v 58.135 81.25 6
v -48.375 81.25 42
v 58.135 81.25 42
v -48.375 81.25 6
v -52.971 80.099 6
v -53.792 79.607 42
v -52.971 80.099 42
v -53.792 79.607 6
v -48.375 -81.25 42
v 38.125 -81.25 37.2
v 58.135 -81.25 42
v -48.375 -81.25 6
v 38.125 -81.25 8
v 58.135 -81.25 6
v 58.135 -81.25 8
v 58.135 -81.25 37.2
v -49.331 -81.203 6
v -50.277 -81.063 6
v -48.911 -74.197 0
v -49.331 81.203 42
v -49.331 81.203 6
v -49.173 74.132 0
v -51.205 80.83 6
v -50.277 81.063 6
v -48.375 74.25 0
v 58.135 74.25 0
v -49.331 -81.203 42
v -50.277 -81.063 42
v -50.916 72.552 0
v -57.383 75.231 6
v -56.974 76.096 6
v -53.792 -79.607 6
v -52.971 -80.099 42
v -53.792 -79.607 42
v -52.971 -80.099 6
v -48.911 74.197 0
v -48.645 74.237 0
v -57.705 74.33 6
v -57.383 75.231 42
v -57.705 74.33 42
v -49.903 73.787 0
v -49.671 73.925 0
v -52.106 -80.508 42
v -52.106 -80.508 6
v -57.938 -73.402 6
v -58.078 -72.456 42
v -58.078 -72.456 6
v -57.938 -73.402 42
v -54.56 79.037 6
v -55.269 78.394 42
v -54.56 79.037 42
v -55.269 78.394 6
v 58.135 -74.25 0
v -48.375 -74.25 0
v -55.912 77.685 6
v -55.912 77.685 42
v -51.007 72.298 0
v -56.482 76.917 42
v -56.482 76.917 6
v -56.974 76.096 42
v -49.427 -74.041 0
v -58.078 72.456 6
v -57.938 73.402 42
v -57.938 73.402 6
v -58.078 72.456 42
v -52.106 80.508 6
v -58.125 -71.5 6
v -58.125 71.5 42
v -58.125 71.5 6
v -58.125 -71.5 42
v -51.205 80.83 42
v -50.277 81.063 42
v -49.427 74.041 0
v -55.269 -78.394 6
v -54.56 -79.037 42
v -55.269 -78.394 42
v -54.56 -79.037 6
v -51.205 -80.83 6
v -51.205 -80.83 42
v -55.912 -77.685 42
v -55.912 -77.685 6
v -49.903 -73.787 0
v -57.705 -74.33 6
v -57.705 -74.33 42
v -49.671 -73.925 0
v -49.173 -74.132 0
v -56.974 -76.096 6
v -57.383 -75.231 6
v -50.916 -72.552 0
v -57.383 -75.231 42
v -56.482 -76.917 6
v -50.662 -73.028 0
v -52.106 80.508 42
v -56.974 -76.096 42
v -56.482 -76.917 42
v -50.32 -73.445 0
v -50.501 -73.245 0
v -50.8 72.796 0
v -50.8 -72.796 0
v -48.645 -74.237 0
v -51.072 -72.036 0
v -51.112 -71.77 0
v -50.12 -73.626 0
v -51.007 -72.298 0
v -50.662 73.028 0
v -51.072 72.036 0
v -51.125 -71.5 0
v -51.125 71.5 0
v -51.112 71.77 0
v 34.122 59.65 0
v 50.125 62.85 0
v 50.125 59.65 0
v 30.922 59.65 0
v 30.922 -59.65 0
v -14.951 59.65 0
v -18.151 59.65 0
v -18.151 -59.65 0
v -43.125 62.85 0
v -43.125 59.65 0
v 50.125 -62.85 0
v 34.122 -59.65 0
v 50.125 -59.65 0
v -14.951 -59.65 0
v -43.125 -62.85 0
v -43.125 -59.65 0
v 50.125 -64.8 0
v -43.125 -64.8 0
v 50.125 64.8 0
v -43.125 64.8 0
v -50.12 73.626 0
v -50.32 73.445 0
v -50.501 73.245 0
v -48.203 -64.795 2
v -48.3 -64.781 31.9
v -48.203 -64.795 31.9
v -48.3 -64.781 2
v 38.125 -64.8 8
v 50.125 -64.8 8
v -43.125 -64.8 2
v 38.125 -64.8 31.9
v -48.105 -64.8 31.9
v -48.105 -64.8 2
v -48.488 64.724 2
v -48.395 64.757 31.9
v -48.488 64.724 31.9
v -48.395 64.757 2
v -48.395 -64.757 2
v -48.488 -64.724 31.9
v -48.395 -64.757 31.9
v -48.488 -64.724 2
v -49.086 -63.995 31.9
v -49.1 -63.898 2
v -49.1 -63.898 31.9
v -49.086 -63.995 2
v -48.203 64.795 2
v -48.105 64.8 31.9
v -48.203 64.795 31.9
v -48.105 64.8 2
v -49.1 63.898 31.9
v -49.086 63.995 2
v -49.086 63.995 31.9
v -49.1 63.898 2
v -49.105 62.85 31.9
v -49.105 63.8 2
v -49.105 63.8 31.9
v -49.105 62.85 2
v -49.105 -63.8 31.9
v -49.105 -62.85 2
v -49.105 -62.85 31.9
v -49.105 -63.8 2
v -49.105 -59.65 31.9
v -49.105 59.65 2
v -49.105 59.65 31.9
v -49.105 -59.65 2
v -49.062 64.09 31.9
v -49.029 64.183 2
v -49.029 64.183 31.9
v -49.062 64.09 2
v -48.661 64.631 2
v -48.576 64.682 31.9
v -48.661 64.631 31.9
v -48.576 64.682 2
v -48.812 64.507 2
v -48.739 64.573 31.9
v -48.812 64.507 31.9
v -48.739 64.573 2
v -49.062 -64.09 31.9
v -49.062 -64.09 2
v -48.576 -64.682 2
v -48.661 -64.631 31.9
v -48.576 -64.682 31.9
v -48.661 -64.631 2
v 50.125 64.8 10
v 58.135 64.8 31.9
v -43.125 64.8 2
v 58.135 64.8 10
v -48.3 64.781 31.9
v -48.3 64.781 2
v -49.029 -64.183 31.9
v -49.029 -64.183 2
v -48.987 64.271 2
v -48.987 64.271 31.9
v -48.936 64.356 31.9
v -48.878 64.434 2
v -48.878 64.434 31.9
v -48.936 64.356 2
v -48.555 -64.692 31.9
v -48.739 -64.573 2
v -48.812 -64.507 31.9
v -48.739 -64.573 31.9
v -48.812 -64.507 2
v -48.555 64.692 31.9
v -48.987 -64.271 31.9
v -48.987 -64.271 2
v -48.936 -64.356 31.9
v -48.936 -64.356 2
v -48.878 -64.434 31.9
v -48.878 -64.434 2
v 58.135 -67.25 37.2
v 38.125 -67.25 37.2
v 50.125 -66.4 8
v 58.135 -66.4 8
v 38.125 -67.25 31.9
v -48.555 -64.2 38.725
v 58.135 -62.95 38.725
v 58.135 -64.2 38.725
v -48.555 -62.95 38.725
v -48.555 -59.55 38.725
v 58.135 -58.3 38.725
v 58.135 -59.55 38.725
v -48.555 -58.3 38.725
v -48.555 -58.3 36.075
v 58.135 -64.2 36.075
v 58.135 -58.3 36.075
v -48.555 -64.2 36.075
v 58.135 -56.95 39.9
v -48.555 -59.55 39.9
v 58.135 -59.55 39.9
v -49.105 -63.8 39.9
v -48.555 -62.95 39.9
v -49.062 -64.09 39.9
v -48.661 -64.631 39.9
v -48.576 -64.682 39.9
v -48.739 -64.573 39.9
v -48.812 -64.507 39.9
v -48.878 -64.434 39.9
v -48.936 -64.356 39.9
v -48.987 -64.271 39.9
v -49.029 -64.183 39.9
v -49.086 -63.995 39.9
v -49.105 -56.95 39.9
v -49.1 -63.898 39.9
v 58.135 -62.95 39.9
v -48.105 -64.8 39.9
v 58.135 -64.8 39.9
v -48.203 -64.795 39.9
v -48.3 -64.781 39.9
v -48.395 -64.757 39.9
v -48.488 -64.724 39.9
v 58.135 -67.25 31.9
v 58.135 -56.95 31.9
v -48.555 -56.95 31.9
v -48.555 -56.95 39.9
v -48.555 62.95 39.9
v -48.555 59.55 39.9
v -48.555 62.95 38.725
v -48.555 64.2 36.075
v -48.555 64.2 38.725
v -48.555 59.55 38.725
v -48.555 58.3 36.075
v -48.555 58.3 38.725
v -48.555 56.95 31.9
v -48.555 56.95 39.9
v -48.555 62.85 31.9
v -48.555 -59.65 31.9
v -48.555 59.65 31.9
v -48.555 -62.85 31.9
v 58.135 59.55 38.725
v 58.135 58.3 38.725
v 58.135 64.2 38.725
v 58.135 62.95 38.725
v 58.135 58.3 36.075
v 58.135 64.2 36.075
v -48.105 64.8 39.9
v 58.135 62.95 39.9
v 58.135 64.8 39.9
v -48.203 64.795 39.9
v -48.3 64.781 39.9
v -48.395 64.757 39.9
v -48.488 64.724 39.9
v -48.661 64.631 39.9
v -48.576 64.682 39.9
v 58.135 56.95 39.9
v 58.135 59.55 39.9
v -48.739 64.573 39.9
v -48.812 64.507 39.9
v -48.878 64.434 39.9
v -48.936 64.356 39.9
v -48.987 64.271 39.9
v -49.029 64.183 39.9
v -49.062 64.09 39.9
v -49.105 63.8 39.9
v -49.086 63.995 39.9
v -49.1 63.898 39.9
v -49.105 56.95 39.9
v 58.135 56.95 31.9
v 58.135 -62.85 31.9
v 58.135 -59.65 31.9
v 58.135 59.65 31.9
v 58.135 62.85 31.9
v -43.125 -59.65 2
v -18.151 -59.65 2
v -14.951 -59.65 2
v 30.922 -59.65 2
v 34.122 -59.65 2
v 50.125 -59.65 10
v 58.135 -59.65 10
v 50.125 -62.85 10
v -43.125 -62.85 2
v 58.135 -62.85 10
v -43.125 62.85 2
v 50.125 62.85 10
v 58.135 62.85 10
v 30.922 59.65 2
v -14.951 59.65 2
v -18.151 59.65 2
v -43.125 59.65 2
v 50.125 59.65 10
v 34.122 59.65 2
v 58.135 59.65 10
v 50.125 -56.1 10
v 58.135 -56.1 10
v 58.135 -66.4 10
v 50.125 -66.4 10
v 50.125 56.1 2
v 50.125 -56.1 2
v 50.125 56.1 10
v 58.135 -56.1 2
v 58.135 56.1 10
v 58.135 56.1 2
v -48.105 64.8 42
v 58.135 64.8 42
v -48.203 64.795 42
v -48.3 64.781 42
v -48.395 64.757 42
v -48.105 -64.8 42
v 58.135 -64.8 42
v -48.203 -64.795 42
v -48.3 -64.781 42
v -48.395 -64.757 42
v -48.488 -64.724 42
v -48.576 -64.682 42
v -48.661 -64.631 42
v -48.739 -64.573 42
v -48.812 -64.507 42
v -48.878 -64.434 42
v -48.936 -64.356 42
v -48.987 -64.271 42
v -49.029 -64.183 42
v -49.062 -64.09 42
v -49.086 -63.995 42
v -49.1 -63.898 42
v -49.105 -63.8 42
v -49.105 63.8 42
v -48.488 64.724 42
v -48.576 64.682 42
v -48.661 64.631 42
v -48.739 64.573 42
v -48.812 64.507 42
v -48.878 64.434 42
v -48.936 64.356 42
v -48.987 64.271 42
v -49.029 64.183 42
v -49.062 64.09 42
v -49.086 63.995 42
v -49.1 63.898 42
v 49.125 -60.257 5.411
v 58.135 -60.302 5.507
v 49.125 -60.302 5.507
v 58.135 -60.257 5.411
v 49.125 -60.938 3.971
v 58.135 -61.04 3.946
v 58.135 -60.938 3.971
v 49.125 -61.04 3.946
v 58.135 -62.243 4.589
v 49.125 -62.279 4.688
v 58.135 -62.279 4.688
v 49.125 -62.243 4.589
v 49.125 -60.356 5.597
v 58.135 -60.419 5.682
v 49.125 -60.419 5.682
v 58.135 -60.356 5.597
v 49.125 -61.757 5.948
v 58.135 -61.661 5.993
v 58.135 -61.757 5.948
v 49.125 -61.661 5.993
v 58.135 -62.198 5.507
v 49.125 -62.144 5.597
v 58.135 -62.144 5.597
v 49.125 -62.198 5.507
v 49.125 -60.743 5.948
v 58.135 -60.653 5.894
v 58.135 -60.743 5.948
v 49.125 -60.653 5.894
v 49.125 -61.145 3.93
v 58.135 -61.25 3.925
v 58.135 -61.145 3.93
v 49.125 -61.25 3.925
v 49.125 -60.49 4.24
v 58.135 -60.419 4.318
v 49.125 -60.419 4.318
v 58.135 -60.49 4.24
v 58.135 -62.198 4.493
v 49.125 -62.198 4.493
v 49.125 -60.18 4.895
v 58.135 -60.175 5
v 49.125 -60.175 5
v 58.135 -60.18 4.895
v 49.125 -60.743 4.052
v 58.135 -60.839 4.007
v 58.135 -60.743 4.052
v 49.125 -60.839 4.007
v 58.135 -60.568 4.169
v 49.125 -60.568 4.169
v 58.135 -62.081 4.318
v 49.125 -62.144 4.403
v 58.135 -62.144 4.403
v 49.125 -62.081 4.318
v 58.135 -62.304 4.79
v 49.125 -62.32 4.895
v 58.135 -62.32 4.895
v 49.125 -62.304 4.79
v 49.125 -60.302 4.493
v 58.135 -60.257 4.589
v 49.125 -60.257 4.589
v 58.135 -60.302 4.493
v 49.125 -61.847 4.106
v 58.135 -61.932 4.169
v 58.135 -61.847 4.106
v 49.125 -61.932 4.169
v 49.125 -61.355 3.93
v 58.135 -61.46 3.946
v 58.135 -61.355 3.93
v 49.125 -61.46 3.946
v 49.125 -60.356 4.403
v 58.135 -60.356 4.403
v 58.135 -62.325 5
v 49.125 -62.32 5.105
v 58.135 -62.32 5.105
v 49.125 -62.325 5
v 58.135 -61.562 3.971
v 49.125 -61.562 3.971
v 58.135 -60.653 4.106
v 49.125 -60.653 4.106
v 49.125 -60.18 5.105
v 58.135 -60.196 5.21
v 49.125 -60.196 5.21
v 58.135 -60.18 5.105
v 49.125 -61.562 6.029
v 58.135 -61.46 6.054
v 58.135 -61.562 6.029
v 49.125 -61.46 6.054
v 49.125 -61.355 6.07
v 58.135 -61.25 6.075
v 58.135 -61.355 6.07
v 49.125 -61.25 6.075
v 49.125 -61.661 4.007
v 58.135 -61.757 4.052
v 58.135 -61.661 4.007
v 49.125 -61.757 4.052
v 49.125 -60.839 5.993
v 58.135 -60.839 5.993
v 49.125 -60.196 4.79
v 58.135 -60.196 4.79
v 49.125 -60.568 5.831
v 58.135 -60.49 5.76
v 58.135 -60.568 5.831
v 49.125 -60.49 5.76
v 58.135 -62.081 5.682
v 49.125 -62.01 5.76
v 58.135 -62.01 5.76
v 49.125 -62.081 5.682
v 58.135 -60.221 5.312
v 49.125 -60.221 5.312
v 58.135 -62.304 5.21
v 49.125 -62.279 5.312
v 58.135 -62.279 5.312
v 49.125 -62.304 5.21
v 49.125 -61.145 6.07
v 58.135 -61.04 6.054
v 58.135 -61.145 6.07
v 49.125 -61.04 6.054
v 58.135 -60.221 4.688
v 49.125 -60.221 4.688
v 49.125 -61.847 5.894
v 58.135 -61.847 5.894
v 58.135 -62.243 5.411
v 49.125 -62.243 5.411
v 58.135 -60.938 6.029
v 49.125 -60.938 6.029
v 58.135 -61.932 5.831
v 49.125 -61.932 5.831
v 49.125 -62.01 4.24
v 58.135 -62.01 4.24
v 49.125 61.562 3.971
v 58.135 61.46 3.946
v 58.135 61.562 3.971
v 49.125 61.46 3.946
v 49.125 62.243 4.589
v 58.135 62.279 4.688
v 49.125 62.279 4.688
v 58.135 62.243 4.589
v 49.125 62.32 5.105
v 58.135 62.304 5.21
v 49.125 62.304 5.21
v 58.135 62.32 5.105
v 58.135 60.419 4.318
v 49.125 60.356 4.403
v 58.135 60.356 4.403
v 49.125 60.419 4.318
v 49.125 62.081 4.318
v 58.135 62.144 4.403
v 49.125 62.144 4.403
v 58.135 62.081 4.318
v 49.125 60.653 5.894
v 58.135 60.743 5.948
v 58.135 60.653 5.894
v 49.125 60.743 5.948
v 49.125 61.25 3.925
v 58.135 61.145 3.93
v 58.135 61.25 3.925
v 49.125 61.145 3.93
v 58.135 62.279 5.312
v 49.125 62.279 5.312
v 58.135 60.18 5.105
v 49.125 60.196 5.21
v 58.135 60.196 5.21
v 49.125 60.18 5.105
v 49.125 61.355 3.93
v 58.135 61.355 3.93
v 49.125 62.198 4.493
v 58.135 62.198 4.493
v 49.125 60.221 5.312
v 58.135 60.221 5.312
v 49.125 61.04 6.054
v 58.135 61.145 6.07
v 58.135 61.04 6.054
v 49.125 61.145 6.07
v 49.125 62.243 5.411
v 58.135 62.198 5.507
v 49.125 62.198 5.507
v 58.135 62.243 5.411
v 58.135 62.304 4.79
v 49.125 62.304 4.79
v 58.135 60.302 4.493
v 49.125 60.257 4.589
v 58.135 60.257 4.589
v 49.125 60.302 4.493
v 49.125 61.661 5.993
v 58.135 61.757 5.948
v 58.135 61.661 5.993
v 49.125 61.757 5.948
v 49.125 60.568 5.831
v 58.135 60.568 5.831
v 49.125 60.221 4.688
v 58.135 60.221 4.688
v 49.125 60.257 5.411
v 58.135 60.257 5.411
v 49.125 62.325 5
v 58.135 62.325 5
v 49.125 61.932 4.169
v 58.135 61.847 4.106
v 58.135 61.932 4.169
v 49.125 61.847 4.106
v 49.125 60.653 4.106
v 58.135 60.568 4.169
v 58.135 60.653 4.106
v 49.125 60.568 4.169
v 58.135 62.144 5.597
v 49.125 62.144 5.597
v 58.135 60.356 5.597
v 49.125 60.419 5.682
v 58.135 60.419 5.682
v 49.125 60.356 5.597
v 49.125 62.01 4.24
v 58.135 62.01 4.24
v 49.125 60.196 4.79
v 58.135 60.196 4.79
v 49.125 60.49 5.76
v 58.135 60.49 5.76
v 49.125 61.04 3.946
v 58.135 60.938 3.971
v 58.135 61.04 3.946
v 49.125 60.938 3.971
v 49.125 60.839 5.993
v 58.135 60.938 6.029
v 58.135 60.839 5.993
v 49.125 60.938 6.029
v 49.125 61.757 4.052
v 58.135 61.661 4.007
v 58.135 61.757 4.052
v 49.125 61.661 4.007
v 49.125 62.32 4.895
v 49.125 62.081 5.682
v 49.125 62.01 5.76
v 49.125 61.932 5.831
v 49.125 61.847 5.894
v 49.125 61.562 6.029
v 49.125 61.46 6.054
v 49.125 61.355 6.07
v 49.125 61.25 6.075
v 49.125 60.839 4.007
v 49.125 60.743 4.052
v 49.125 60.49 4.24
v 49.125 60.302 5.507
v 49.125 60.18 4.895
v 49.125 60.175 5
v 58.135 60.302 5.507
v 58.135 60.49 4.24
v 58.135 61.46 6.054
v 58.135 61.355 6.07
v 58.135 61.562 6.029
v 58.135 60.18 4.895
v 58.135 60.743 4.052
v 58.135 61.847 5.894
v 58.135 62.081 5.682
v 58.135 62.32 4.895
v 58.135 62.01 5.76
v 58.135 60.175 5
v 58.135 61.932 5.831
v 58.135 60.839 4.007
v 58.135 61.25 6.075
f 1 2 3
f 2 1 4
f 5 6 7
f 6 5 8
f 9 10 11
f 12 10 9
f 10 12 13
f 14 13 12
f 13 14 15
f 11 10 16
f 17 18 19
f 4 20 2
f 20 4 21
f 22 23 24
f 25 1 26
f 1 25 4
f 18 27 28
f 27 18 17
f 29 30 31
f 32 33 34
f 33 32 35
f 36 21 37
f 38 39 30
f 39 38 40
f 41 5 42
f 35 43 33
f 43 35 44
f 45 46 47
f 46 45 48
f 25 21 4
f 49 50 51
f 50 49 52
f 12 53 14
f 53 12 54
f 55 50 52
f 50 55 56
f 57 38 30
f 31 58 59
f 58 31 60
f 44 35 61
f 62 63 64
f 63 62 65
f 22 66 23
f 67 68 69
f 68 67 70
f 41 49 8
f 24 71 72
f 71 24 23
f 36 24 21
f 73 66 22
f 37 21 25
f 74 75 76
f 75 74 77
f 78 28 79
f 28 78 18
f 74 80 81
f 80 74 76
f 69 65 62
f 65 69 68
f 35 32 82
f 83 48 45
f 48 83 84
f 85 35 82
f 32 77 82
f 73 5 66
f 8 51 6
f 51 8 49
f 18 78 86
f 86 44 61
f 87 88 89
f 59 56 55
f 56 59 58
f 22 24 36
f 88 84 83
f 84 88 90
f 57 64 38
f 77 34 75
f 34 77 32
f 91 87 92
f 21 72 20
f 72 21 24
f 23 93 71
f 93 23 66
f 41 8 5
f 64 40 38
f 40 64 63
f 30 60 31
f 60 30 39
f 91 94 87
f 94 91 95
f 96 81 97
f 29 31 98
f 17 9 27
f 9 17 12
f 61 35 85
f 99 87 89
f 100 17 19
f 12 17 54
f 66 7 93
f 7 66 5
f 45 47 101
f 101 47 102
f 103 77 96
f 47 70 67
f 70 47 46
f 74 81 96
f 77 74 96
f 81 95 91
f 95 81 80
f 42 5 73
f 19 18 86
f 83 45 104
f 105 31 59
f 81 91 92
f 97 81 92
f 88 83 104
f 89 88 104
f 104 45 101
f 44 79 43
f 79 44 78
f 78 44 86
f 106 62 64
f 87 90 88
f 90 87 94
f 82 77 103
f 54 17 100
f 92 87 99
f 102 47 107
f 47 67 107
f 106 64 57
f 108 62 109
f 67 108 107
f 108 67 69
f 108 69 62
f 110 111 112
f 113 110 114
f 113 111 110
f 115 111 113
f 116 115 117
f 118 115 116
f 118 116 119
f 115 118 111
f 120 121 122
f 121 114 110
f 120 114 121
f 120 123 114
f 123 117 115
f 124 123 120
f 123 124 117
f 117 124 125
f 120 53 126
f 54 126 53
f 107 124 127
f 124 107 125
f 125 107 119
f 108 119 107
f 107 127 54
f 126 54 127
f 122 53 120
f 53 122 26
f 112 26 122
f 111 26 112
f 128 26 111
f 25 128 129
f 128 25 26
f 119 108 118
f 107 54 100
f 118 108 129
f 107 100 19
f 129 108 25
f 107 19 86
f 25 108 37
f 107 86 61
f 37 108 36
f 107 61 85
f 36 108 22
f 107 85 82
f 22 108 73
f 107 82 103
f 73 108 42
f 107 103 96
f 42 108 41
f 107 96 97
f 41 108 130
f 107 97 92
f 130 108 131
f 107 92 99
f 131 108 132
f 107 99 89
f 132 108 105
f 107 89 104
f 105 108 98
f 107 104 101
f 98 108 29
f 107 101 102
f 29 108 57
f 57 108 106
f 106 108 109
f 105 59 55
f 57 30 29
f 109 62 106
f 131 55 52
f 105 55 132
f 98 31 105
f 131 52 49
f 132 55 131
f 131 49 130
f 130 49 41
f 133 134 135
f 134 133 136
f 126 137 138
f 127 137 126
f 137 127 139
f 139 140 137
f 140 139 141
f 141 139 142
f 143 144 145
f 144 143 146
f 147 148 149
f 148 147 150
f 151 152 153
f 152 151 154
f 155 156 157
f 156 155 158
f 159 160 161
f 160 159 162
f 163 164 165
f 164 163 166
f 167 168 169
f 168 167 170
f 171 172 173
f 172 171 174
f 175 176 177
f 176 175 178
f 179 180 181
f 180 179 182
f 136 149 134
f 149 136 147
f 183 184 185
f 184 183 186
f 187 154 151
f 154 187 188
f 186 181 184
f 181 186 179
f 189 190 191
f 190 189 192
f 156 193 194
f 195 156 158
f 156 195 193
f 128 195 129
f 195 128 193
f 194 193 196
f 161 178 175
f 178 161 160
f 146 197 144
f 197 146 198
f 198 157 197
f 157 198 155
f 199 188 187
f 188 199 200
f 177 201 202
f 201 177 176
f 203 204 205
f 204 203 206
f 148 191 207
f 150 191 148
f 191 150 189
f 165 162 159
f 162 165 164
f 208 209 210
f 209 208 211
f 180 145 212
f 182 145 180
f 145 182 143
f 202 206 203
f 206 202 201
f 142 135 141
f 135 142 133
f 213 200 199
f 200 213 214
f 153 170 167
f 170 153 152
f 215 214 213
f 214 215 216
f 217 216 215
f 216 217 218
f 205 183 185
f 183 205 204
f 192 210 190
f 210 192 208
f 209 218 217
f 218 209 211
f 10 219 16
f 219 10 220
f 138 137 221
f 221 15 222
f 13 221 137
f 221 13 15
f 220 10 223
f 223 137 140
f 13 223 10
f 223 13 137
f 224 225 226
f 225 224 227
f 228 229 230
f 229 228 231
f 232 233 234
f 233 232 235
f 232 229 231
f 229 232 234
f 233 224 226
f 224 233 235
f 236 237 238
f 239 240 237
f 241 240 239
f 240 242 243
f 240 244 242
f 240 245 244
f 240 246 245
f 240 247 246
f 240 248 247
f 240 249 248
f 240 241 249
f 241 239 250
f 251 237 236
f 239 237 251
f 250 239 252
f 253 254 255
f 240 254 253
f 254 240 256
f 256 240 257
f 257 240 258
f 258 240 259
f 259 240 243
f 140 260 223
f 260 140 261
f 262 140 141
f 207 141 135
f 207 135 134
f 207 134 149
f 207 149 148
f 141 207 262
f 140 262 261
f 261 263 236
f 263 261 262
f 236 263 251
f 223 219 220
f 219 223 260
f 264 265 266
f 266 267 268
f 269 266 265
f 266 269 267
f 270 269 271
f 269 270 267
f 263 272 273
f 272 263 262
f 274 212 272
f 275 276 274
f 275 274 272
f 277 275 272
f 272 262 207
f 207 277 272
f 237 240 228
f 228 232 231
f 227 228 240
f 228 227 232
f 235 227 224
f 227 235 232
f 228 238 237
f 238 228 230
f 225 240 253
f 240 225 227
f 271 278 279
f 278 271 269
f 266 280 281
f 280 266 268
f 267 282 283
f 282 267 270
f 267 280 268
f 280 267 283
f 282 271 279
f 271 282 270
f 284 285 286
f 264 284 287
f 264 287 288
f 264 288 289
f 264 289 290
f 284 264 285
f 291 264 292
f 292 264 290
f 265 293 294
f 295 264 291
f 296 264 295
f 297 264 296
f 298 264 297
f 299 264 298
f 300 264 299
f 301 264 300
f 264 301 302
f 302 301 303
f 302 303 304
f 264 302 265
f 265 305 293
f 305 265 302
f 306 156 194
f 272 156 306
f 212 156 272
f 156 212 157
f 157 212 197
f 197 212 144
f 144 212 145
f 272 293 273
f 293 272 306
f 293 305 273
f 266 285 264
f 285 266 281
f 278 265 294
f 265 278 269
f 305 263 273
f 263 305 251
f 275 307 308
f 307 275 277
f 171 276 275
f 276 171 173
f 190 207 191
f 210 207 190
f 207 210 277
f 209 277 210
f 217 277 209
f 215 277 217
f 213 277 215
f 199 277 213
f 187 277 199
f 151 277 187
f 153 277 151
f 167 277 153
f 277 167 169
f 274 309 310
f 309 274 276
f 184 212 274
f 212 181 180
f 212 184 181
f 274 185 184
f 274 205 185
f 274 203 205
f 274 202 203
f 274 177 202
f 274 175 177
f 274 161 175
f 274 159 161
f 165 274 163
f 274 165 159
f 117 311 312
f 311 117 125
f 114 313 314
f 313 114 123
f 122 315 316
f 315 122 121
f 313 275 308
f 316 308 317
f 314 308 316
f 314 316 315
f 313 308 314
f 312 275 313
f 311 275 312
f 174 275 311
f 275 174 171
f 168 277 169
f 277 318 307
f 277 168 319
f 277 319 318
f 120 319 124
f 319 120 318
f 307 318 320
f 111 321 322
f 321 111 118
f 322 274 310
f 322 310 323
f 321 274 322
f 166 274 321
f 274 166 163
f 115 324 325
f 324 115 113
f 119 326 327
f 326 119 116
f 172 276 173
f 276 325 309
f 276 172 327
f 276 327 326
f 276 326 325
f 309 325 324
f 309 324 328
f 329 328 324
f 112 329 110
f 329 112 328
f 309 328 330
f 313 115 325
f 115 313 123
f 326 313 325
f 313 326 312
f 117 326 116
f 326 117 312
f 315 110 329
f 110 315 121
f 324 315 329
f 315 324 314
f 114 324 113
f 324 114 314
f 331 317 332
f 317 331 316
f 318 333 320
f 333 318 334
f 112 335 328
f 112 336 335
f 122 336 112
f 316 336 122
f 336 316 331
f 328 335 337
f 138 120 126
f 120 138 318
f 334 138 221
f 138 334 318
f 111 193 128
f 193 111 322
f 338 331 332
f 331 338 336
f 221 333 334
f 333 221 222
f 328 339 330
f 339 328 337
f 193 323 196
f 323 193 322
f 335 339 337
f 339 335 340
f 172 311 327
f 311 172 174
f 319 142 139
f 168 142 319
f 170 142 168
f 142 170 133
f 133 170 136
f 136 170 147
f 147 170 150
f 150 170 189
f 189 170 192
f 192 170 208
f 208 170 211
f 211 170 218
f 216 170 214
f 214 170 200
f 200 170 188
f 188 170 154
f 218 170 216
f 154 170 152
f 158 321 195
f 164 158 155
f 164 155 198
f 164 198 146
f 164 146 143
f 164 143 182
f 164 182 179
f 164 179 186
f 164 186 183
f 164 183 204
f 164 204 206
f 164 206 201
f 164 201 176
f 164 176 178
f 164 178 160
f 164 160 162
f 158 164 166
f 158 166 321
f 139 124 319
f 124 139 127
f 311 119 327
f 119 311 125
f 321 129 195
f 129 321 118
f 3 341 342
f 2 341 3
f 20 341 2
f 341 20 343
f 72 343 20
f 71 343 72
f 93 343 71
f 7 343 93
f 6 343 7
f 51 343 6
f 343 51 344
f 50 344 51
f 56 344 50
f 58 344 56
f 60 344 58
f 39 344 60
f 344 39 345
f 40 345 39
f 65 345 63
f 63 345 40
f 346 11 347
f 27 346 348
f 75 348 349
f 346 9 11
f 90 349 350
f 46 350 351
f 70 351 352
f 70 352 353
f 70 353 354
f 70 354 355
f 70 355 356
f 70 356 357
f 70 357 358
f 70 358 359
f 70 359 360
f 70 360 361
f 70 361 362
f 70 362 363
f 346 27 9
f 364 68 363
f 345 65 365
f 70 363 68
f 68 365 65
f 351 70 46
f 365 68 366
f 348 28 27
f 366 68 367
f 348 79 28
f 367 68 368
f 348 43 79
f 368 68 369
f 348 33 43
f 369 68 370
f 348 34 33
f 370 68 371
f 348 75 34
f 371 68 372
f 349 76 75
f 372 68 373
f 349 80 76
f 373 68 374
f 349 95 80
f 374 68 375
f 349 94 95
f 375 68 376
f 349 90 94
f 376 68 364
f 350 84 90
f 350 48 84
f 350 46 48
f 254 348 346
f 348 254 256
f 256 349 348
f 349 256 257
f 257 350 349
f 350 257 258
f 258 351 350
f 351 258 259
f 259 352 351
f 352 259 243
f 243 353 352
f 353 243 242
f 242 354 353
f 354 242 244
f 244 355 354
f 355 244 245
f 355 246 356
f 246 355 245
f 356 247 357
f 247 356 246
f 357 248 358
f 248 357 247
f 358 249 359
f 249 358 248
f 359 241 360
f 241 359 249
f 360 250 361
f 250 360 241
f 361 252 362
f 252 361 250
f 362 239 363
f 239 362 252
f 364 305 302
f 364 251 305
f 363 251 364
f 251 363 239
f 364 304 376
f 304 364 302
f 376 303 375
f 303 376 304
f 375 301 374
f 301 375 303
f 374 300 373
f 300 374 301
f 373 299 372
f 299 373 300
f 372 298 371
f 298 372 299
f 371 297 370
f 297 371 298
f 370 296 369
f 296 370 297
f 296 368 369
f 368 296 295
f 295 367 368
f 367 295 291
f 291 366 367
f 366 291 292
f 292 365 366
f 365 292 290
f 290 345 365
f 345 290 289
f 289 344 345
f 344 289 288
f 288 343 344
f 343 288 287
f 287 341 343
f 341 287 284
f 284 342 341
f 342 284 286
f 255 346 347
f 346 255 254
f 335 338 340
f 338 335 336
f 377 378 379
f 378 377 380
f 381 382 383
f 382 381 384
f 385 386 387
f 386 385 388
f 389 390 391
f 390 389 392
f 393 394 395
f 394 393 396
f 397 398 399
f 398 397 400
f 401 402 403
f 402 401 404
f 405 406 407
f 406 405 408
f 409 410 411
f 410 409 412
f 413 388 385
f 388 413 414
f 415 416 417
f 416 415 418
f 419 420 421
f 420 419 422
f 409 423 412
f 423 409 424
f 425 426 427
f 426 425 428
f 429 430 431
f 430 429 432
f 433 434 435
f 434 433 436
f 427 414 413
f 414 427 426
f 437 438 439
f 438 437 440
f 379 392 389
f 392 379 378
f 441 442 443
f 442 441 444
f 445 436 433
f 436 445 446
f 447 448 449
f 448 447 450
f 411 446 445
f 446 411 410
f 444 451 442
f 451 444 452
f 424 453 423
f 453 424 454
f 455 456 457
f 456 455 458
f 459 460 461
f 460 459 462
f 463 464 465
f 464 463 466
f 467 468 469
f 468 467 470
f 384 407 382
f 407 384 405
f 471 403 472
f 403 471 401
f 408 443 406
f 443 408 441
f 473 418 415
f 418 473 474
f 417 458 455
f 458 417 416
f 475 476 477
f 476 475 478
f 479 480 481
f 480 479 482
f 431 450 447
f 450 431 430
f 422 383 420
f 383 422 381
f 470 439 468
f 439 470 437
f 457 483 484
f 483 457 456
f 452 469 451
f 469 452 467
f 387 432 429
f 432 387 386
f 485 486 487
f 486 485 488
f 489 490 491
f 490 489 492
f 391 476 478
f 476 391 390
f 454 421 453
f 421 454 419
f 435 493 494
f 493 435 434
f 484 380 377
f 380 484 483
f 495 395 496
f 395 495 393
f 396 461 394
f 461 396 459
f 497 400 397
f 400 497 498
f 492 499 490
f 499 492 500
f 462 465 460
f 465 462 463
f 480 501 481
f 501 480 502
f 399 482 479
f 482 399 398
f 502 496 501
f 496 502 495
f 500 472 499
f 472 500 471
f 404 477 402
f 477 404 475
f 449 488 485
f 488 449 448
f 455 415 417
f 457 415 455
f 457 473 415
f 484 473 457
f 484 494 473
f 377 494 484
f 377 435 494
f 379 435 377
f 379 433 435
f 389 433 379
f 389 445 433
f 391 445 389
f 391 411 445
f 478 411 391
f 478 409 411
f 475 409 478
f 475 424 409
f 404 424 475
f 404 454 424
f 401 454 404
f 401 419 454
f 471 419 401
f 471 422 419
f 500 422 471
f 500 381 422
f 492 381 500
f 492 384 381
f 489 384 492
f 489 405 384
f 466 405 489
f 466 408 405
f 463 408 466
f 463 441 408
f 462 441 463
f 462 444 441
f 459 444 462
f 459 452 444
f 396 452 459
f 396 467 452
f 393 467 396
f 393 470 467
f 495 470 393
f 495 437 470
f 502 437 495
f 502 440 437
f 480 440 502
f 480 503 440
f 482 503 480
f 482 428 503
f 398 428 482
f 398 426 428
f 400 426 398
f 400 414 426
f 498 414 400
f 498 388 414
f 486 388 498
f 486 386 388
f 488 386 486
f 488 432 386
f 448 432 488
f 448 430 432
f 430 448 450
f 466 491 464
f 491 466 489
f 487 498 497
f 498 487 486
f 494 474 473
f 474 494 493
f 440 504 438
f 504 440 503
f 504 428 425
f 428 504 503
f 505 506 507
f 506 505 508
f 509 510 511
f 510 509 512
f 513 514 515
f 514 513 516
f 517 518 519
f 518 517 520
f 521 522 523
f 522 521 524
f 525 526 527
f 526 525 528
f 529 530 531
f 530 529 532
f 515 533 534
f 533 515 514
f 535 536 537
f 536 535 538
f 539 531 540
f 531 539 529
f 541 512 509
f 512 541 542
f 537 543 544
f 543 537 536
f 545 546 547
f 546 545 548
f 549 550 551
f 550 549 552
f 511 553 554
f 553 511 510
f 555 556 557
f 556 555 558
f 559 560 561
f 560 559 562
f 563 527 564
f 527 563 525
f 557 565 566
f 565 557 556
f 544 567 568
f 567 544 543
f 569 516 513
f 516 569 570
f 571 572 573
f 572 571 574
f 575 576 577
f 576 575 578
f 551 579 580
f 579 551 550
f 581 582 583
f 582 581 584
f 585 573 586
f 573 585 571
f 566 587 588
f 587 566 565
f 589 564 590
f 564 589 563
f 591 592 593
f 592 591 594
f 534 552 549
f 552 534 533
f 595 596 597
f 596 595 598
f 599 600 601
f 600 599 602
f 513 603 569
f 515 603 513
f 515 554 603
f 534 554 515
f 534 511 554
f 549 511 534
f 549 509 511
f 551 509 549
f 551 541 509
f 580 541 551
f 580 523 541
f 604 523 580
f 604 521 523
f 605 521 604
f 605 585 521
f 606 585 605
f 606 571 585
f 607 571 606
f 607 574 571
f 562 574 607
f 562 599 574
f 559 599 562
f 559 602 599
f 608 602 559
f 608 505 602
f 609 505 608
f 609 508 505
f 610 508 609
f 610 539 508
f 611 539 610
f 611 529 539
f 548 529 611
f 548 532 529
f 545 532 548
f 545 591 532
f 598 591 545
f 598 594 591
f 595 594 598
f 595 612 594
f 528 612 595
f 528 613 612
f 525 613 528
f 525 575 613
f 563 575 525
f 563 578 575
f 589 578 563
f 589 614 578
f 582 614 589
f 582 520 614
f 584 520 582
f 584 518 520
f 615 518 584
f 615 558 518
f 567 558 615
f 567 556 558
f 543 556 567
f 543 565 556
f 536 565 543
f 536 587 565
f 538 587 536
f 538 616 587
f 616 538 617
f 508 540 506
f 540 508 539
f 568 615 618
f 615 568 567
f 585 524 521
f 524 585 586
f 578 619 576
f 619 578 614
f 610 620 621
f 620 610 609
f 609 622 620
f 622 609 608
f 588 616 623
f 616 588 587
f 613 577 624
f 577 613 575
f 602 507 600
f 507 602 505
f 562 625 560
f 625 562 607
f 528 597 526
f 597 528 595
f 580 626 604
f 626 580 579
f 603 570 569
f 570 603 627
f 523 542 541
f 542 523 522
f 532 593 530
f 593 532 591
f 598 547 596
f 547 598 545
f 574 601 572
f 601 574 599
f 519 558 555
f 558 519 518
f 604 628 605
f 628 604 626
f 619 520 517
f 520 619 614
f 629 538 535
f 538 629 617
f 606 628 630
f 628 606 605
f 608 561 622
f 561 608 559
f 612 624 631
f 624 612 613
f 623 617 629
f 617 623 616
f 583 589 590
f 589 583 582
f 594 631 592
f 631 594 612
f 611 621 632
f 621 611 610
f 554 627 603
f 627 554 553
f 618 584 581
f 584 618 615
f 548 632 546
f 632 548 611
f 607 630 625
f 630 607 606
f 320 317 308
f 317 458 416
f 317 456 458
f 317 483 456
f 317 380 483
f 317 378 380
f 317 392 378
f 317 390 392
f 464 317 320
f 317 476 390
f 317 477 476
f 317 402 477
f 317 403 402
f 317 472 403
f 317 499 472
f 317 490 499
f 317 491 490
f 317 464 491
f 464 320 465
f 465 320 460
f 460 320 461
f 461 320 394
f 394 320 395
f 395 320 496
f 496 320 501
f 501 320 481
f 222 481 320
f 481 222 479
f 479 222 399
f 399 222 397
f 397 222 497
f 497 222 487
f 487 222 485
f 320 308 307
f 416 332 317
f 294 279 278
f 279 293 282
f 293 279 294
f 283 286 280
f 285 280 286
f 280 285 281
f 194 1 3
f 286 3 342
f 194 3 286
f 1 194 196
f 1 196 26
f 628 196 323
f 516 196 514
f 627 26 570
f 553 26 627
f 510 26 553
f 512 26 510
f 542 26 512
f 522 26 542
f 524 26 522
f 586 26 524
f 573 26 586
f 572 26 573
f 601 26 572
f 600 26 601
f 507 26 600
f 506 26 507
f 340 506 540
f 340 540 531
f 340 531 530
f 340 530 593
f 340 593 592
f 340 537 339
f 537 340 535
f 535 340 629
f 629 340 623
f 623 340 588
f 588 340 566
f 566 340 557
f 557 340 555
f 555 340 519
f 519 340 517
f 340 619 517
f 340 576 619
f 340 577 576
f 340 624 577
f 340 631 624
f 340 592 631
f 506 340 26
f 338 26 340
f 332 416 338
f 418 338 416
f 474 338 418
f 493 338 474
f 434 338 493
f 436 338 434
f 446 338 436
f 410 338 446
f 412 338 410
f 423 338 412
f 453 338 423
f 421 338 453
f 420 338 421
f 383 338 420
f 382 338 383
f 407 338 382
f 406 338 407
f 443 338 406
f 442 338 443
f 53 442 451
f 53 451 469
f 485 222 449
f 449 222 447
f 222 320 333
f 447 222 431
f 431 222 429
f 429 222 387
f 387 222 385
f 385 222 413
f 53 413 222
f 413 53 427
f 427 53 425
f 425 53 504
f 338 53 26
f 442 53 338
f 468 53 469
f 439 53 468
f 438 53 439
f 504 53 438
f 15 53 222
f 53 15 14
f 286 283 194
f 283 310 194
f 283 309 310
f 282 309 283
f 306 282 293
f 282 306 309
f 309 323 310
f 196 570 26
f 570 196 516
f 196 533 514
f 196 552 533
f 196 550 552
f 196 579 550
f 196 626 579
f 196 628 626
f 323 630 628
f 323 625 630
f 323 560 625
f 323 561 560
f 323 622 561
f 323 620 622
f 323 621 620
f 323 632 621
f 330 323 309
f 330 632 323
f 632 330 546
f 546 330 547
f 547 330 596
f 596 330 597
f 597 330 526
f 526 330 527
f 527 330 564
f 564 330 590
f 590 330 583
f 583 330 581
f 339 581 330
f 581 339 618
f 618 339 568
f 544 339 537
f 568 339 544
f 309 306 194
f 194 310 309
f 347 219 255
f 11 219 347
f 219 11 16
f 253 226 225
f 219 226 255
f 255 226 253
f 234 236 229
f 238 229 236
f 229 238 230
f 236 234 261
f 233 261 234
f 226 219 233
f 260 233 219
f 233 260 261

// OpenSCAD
// Peli-style case insert for 42HP / 3U Eurorack
// Case marked: MG 235x165x45 (base)
// Outer profile shrinks at the floor to clear the case's floor-to-wall fillet
// (+ light draft). Print foot-down on A1 Mini; two halves.
//
// OpenSCAD Customizer:
//   part = "left" | "right" | "both" | "assembled"

/* [Which part] */
part = "left"; // ["left", "right", "both", "assembled"]

/* [Case interior] */
case_l = 235;
case_w = 165;
case_h = 45;
case_corner_r = 11;    // confirmed via corner fit test
fit_clearance = 2.5;   // was 1.0 — print was tight and bowed in the case
// Floor-to-wall fillet inside the case (confirmed via corner fit test)
base_fillet_r = 6;
// Extra inset at the very bottom for mould draft / print tolerance
draft_inset = 1.0;

/* [Frame] */
wall = 2.4;
foot_t = 2.0;
foot_w = 8.0;
deck_t = 2.8;
insert_h = 42;
rail_h = 8.0;
// Rail is asymmetric about the screw/nut centre (hole line):
// less material toward the bay (PCB clearance), more toward the panel edge.
rail_bay = 4.3;            // from slot centre toward module bay (~1.35mm nut wall)
rail_outer = 6.0;          // from slot centre toward panel edge
spine_w = 3.2;

/* [Eurorack — Doepfer / standard 3U] */
hp = 5.08;
hp_count = 42;
panel_l = hp_count * hp;   // 213.36 — nominal 42HP
panel_h = 128.5;           // standard 3U panel height
hole_inset = 3.0;          // hole centre from panel top/bottom edge
panel_t = 1.6;
module_drop = 0.5;         // seat panel this much below deck
panel_clear = 0.55;
panel_corner_r = 1.0;

/* [M3 square nut track] */
nut_cavity_w = 5.9;
nut_cavity_h = 2.6;
screw_slot = 3.4;          // M3 clearance — ~1.25mm nut overlap each side
slot_lip = 1.2;            // solid retainer over the nut


/* [Split join — filament / dowel pins] */
pin_d = 2.0;
pin_clear = 0.15;
join_boss_x = 16;
join_boss_h = 10;

/* [Quality] */
$fn = 64;

// ---------------------------------------------------------------------------
// Derived
// ---------------------------------------------------------------------------
outer_l = case_l - fit_clearance;
outer_w = case_w - fit_clearance;
outer_r = max(1, case_corner_r - fit_clearance / 2);

// Bottom footprint clears fillet + draft (usable floor is smaller than rim)
bottom_inset = base_fillet_r + draft_inset;
bottom_l = outer_l - 2 * bottom_inset;
bottom_w = outer_w - 2 * bottom_inset;
bottom_r = max(1, outer_r - bottom_inset);

rail_span = panel_l;                         // full 42HP
rail_hole_cc = panel_h - 2 * hole_inset;     // 122.5
rail_y0 = -rail_hole_cc / 2;
rail_y1 =  rail_hole_cc / 2;
rail_top_z = insert_h - panel_t - module_drop;
rail_z = rail_top_z - rail_h;
rail_len = rail_span + 2 * wall;
rail_w = rail_bay + rail_outer;              // total rail width

panel_pocket_l = panel_l + 2 * panel_clear;
panel_pocket_w = panel_h + 2 * panel_clear;

wall_inner_h = insert_h - deck_t;

echo(str("Rim outer: ", outer_l, " x ", outer_w, " R", outer_r));
echo(str("Floor outer: ", bottom_l, " x ", bottom_w, " R", bottom_r,
         " (fillet ", base_fillet_r, " + draft ", draft_inset, ")"));
echo(str("42HP x 3U panel: ", panel_l, " x ", panel_h));
echo(str("Panel pocket: ", panel_pocket_l, " x ", panel_pocket_w));
echo(str("Rail hole CC: ", rail_hole_cc, " (holes ", hole_inset, " from edge)"));
echo(str("Rail section: bay ", rail_bay, " / outer ", rail_outer,
         " (nut side wall ", rail_bay - nut_cavity_w / 2, " mm)"));
echo(str("Module drop: ", module_drop, " mm, slot lip: ", slot_lip, " mm"));
echo(str("Half length at rim: ", outer_l / 2, " mm"));

// ---------------------------------------------------------------------------
// Helpers
// ---------------------------------------------------------------------------
module rounded_rect(size, r) {
    l = size[0];
    w = size[1];
    rr = min(r, l / 2 - 0.01, w / 2 - 0.01);
    offset(r = rr)
        square([l - 2 * rr, w - 2 * rr], center = true);
}

module frame_ring_2d(outer_size, inner_shrink, r) {
    difference() {
        rounded_rect(outer_size, r);
        rounded_rect(
            [outer_size[0] - 2 * inner_shrink, outer_size[1] - 2 * inner_shrink],
            max(0.4, r - inner_shrink)
        );
    }
}

// Cross-section of the case-fit outline at height z (0 = floor).
// Blends from reduced floor size up to full rim size over base_fillet_r.
module fit_profile_2d(z, inset = 0) {
    t = base_fillet_r <= 0 ? 1 : min(1, max(0, z) / base_fillet_r);
    l = bottom_l + t * (outer_l - bottom_l) - 2 * inset;
    w = bottom_w + t * (outer_w - bottom_w) - 2 * inset;
    r = max(0.4, bottom_r + t * (outer_r - bottom_r) - inset);
    rounded_rect([max(l, 1), max(w, 1)], r);
}

// Solid loft that follows the case fillet (small at floor → full at rim)
module fit_loft_solid(h, inset = 0) {
    hull() {
        translate([0, 0, 0])
            linear_extrude(height = 0.02)
                fit_profile_2d(0, inset);
        translate([0, 0, base_fillet_r])
            linear_extrude(height = 0.02)
                fit_profile_2d(base_fillet_r, inset);
        if (h > base_fillet_r + 0.05)
            translate([0, 0, h])
                linear_extrude(height = 0.02)
                    fit_profile_2d(base_fillet_r, inset);
    }
}

module t_slot_rail(length, bay_dir) {
    // bay_dir: sign toward the module bay (+1 or -1 along Y)
    // Slot/nut stay on the hole centreline. Body is asymmetric:
    // rail_bay toward the bay (PCB clearance), rail_outer toward the panel edge.
    nut_z = rail_h - slot_lip - nut_cavity_h / 2;
    y_bay = bay_dir * rail_bay;
    y_outer = -bay_dir * rail_outer;
    y_min = min(y_bay, y_outer);
    y_max = max(y_bay, y_outer);
    body_w = y_max - y_min;
    body_cy = (y_min + y_max) / 2;

    difference() {
        translate([0, body_cy, rail_h / 2])
            cube([length, body_w, rail_h], center = true);

        // Nut gallery — centred on the hole/slot line (Y=0 local)
        translate([0, 0, nut_z])
            cube([length - 2 * wall, nut_cavity_w, nut_cavity_h + 0.05], center = true);

        // Screw slot through top lip
        translate([0, 0, rail_h - slot_lip / 2])
            cube([length - 2 * wall, screw_slot, slot_lip + 0.2], center = true);

        // End-loading ports for square nuts
        for (sx = [-1, 1])
            translate([sx * (length / 2 - wall / 2), 0, nut_z])
                cube([wall + 0.4, nut_cavity_w, nut_cavity_h + 0.05], center = true);
    }
}

module top_deck() {
    // Frame only — never build a full plate over the bay (avoids a leftover skin)
    translate([0, 0, insert_h - deck_t])
        linear_extrude(height = deck_t)
            difference() {
                rounded_rect([outer_l, outer_w], outer_r);
                rounded_rect([panel_pocket_l, panel_pocket_w], panel_corner_r);
            }
}

// Solid outer rim: full case-fit loft minus the panel pocket.
// Only the middle-front access pocket stays open (no hollow gallery cells).
module solid_outer_rim() {
    win_z = base_fillet_r + 2;
    win_h = max(8, wall_inner_h - win_z - 2);
    front_pocket_w = 40;
    front_depth = (outer_w - panel_pocket_w) / 2 + wall;

    difference() {
        fit_loft_solid(wall_inner_h, 0);

        // Punch the module bay fully through the rim (overlap past both ends)
        translate([0, 0, -1])
            linear_extrude(height = wall_inner_h + 2)
                rounded_rect([panel_pocket_l, panel_pocket_w], panel_corner_r);

        // Middle-front access pocket only
        translate([0, -(outer_w / 2 - front_depth / 2), win_z + win_h / 2])
            cube([front_pocket_w, front_depth + 1, win_h], center = true);
    }
}

module rail_spine(y) {
    translate([0, y, rail_z / 2])
        cube([rail_len, spine_w, rail_z], center = true);
}

module pin_holes() {
    d = pin_d + pin_clear;
    z = join_boss_h / 2;
    for (y = [rail_y0, rail_y1])
        translate([0, y, z])
            rotate([0, 90, 0])
                cylinder(d = d, h = join_boss_x + 2, center = true);
}

module insert_body() {
    difference() {
        union() {
            // Foot follows the reduced floor outline (sits inside the fillet)
            linear_extrude(height = foot_t)
                frame_ring_2d([bottom_l, bottom_w], foot_w, bottom_r);

            // Solid outer rim (only middle-front access pocket left open)
            solid_outer_rim();

            top_deck();

            translate([0, rail_y0, rail_z]) t_slot_rail(rail_len, +1); // bay toward +Y
            translate([0, rail_y1, rail_z]) t_slot_rail(rail_len, -1); // bay toward -Y

            rail_spine(rail_y0);
            rail_spine(rail_y1);

            // End ties between rails
            for (sx = [-1, 1])
                translate([sx * (rail_span / 2 + wall / 2), 0, rail_z + rail_h / 2])
                    cube([wall, rail_hole_cc + rail_w, rail_h], center = true);

            for (y = [rail_y0, rail_y1])
                translate([0, y, foot_t / 2])
                    cube([rail_len, spine_w, foot_t], center = true);

            for (x = [-rail_span * 0.35, -rail_span * 0.12, rail_span * 0.12, rail_span * 0.35])
                translate([x, 0, foot_t / 2])
                    cube([spine_w, rail_hole_cc, foot_t], center = true);

            for (y = [rail_y0, rail_y1])
                translate([0, y, join_boss_h / 2])
                    cube([join_boss_x, rail_w, join_boss_h], center = true);

            translate([0, 0, foot_t / 2])
                cube([join_boss_x, rail_hole_cc, foot_t], center = true);
        }

        pin_holes();
    }
}

// ---------------------------------------------------------------------------
// Split (cut at X=0)
// ---------------------------------------------------------------------------
module half_body(which) {
    intersection() {
        insert_body();
        translate([which == "left" ? -outer_l / 2 : outer_l / 2, 0, insert_h / 2])
            cube([outer_l + 0.02, outer_w + 20, insert_h + 20], center = true);
    }
}

module printable(which) {
    translate([which == "left" ? outer_l / 4 : -outer_l / 4, 0, 0])
        half_body(which);
}

if (part == "left") {
    printable("left");
} else if (part == "right") {
    printable("right");
} else if (part == "both") {
    translate([0, -(outer_w / 2 + 10), 0]) printable("left");
    translate([0,  (outer_w / 2 + 10), 0]) printable("right");
} else {
    color("#4a6d8c") half_body("left");
    color("#8ca8c0") half_body("right");
}
